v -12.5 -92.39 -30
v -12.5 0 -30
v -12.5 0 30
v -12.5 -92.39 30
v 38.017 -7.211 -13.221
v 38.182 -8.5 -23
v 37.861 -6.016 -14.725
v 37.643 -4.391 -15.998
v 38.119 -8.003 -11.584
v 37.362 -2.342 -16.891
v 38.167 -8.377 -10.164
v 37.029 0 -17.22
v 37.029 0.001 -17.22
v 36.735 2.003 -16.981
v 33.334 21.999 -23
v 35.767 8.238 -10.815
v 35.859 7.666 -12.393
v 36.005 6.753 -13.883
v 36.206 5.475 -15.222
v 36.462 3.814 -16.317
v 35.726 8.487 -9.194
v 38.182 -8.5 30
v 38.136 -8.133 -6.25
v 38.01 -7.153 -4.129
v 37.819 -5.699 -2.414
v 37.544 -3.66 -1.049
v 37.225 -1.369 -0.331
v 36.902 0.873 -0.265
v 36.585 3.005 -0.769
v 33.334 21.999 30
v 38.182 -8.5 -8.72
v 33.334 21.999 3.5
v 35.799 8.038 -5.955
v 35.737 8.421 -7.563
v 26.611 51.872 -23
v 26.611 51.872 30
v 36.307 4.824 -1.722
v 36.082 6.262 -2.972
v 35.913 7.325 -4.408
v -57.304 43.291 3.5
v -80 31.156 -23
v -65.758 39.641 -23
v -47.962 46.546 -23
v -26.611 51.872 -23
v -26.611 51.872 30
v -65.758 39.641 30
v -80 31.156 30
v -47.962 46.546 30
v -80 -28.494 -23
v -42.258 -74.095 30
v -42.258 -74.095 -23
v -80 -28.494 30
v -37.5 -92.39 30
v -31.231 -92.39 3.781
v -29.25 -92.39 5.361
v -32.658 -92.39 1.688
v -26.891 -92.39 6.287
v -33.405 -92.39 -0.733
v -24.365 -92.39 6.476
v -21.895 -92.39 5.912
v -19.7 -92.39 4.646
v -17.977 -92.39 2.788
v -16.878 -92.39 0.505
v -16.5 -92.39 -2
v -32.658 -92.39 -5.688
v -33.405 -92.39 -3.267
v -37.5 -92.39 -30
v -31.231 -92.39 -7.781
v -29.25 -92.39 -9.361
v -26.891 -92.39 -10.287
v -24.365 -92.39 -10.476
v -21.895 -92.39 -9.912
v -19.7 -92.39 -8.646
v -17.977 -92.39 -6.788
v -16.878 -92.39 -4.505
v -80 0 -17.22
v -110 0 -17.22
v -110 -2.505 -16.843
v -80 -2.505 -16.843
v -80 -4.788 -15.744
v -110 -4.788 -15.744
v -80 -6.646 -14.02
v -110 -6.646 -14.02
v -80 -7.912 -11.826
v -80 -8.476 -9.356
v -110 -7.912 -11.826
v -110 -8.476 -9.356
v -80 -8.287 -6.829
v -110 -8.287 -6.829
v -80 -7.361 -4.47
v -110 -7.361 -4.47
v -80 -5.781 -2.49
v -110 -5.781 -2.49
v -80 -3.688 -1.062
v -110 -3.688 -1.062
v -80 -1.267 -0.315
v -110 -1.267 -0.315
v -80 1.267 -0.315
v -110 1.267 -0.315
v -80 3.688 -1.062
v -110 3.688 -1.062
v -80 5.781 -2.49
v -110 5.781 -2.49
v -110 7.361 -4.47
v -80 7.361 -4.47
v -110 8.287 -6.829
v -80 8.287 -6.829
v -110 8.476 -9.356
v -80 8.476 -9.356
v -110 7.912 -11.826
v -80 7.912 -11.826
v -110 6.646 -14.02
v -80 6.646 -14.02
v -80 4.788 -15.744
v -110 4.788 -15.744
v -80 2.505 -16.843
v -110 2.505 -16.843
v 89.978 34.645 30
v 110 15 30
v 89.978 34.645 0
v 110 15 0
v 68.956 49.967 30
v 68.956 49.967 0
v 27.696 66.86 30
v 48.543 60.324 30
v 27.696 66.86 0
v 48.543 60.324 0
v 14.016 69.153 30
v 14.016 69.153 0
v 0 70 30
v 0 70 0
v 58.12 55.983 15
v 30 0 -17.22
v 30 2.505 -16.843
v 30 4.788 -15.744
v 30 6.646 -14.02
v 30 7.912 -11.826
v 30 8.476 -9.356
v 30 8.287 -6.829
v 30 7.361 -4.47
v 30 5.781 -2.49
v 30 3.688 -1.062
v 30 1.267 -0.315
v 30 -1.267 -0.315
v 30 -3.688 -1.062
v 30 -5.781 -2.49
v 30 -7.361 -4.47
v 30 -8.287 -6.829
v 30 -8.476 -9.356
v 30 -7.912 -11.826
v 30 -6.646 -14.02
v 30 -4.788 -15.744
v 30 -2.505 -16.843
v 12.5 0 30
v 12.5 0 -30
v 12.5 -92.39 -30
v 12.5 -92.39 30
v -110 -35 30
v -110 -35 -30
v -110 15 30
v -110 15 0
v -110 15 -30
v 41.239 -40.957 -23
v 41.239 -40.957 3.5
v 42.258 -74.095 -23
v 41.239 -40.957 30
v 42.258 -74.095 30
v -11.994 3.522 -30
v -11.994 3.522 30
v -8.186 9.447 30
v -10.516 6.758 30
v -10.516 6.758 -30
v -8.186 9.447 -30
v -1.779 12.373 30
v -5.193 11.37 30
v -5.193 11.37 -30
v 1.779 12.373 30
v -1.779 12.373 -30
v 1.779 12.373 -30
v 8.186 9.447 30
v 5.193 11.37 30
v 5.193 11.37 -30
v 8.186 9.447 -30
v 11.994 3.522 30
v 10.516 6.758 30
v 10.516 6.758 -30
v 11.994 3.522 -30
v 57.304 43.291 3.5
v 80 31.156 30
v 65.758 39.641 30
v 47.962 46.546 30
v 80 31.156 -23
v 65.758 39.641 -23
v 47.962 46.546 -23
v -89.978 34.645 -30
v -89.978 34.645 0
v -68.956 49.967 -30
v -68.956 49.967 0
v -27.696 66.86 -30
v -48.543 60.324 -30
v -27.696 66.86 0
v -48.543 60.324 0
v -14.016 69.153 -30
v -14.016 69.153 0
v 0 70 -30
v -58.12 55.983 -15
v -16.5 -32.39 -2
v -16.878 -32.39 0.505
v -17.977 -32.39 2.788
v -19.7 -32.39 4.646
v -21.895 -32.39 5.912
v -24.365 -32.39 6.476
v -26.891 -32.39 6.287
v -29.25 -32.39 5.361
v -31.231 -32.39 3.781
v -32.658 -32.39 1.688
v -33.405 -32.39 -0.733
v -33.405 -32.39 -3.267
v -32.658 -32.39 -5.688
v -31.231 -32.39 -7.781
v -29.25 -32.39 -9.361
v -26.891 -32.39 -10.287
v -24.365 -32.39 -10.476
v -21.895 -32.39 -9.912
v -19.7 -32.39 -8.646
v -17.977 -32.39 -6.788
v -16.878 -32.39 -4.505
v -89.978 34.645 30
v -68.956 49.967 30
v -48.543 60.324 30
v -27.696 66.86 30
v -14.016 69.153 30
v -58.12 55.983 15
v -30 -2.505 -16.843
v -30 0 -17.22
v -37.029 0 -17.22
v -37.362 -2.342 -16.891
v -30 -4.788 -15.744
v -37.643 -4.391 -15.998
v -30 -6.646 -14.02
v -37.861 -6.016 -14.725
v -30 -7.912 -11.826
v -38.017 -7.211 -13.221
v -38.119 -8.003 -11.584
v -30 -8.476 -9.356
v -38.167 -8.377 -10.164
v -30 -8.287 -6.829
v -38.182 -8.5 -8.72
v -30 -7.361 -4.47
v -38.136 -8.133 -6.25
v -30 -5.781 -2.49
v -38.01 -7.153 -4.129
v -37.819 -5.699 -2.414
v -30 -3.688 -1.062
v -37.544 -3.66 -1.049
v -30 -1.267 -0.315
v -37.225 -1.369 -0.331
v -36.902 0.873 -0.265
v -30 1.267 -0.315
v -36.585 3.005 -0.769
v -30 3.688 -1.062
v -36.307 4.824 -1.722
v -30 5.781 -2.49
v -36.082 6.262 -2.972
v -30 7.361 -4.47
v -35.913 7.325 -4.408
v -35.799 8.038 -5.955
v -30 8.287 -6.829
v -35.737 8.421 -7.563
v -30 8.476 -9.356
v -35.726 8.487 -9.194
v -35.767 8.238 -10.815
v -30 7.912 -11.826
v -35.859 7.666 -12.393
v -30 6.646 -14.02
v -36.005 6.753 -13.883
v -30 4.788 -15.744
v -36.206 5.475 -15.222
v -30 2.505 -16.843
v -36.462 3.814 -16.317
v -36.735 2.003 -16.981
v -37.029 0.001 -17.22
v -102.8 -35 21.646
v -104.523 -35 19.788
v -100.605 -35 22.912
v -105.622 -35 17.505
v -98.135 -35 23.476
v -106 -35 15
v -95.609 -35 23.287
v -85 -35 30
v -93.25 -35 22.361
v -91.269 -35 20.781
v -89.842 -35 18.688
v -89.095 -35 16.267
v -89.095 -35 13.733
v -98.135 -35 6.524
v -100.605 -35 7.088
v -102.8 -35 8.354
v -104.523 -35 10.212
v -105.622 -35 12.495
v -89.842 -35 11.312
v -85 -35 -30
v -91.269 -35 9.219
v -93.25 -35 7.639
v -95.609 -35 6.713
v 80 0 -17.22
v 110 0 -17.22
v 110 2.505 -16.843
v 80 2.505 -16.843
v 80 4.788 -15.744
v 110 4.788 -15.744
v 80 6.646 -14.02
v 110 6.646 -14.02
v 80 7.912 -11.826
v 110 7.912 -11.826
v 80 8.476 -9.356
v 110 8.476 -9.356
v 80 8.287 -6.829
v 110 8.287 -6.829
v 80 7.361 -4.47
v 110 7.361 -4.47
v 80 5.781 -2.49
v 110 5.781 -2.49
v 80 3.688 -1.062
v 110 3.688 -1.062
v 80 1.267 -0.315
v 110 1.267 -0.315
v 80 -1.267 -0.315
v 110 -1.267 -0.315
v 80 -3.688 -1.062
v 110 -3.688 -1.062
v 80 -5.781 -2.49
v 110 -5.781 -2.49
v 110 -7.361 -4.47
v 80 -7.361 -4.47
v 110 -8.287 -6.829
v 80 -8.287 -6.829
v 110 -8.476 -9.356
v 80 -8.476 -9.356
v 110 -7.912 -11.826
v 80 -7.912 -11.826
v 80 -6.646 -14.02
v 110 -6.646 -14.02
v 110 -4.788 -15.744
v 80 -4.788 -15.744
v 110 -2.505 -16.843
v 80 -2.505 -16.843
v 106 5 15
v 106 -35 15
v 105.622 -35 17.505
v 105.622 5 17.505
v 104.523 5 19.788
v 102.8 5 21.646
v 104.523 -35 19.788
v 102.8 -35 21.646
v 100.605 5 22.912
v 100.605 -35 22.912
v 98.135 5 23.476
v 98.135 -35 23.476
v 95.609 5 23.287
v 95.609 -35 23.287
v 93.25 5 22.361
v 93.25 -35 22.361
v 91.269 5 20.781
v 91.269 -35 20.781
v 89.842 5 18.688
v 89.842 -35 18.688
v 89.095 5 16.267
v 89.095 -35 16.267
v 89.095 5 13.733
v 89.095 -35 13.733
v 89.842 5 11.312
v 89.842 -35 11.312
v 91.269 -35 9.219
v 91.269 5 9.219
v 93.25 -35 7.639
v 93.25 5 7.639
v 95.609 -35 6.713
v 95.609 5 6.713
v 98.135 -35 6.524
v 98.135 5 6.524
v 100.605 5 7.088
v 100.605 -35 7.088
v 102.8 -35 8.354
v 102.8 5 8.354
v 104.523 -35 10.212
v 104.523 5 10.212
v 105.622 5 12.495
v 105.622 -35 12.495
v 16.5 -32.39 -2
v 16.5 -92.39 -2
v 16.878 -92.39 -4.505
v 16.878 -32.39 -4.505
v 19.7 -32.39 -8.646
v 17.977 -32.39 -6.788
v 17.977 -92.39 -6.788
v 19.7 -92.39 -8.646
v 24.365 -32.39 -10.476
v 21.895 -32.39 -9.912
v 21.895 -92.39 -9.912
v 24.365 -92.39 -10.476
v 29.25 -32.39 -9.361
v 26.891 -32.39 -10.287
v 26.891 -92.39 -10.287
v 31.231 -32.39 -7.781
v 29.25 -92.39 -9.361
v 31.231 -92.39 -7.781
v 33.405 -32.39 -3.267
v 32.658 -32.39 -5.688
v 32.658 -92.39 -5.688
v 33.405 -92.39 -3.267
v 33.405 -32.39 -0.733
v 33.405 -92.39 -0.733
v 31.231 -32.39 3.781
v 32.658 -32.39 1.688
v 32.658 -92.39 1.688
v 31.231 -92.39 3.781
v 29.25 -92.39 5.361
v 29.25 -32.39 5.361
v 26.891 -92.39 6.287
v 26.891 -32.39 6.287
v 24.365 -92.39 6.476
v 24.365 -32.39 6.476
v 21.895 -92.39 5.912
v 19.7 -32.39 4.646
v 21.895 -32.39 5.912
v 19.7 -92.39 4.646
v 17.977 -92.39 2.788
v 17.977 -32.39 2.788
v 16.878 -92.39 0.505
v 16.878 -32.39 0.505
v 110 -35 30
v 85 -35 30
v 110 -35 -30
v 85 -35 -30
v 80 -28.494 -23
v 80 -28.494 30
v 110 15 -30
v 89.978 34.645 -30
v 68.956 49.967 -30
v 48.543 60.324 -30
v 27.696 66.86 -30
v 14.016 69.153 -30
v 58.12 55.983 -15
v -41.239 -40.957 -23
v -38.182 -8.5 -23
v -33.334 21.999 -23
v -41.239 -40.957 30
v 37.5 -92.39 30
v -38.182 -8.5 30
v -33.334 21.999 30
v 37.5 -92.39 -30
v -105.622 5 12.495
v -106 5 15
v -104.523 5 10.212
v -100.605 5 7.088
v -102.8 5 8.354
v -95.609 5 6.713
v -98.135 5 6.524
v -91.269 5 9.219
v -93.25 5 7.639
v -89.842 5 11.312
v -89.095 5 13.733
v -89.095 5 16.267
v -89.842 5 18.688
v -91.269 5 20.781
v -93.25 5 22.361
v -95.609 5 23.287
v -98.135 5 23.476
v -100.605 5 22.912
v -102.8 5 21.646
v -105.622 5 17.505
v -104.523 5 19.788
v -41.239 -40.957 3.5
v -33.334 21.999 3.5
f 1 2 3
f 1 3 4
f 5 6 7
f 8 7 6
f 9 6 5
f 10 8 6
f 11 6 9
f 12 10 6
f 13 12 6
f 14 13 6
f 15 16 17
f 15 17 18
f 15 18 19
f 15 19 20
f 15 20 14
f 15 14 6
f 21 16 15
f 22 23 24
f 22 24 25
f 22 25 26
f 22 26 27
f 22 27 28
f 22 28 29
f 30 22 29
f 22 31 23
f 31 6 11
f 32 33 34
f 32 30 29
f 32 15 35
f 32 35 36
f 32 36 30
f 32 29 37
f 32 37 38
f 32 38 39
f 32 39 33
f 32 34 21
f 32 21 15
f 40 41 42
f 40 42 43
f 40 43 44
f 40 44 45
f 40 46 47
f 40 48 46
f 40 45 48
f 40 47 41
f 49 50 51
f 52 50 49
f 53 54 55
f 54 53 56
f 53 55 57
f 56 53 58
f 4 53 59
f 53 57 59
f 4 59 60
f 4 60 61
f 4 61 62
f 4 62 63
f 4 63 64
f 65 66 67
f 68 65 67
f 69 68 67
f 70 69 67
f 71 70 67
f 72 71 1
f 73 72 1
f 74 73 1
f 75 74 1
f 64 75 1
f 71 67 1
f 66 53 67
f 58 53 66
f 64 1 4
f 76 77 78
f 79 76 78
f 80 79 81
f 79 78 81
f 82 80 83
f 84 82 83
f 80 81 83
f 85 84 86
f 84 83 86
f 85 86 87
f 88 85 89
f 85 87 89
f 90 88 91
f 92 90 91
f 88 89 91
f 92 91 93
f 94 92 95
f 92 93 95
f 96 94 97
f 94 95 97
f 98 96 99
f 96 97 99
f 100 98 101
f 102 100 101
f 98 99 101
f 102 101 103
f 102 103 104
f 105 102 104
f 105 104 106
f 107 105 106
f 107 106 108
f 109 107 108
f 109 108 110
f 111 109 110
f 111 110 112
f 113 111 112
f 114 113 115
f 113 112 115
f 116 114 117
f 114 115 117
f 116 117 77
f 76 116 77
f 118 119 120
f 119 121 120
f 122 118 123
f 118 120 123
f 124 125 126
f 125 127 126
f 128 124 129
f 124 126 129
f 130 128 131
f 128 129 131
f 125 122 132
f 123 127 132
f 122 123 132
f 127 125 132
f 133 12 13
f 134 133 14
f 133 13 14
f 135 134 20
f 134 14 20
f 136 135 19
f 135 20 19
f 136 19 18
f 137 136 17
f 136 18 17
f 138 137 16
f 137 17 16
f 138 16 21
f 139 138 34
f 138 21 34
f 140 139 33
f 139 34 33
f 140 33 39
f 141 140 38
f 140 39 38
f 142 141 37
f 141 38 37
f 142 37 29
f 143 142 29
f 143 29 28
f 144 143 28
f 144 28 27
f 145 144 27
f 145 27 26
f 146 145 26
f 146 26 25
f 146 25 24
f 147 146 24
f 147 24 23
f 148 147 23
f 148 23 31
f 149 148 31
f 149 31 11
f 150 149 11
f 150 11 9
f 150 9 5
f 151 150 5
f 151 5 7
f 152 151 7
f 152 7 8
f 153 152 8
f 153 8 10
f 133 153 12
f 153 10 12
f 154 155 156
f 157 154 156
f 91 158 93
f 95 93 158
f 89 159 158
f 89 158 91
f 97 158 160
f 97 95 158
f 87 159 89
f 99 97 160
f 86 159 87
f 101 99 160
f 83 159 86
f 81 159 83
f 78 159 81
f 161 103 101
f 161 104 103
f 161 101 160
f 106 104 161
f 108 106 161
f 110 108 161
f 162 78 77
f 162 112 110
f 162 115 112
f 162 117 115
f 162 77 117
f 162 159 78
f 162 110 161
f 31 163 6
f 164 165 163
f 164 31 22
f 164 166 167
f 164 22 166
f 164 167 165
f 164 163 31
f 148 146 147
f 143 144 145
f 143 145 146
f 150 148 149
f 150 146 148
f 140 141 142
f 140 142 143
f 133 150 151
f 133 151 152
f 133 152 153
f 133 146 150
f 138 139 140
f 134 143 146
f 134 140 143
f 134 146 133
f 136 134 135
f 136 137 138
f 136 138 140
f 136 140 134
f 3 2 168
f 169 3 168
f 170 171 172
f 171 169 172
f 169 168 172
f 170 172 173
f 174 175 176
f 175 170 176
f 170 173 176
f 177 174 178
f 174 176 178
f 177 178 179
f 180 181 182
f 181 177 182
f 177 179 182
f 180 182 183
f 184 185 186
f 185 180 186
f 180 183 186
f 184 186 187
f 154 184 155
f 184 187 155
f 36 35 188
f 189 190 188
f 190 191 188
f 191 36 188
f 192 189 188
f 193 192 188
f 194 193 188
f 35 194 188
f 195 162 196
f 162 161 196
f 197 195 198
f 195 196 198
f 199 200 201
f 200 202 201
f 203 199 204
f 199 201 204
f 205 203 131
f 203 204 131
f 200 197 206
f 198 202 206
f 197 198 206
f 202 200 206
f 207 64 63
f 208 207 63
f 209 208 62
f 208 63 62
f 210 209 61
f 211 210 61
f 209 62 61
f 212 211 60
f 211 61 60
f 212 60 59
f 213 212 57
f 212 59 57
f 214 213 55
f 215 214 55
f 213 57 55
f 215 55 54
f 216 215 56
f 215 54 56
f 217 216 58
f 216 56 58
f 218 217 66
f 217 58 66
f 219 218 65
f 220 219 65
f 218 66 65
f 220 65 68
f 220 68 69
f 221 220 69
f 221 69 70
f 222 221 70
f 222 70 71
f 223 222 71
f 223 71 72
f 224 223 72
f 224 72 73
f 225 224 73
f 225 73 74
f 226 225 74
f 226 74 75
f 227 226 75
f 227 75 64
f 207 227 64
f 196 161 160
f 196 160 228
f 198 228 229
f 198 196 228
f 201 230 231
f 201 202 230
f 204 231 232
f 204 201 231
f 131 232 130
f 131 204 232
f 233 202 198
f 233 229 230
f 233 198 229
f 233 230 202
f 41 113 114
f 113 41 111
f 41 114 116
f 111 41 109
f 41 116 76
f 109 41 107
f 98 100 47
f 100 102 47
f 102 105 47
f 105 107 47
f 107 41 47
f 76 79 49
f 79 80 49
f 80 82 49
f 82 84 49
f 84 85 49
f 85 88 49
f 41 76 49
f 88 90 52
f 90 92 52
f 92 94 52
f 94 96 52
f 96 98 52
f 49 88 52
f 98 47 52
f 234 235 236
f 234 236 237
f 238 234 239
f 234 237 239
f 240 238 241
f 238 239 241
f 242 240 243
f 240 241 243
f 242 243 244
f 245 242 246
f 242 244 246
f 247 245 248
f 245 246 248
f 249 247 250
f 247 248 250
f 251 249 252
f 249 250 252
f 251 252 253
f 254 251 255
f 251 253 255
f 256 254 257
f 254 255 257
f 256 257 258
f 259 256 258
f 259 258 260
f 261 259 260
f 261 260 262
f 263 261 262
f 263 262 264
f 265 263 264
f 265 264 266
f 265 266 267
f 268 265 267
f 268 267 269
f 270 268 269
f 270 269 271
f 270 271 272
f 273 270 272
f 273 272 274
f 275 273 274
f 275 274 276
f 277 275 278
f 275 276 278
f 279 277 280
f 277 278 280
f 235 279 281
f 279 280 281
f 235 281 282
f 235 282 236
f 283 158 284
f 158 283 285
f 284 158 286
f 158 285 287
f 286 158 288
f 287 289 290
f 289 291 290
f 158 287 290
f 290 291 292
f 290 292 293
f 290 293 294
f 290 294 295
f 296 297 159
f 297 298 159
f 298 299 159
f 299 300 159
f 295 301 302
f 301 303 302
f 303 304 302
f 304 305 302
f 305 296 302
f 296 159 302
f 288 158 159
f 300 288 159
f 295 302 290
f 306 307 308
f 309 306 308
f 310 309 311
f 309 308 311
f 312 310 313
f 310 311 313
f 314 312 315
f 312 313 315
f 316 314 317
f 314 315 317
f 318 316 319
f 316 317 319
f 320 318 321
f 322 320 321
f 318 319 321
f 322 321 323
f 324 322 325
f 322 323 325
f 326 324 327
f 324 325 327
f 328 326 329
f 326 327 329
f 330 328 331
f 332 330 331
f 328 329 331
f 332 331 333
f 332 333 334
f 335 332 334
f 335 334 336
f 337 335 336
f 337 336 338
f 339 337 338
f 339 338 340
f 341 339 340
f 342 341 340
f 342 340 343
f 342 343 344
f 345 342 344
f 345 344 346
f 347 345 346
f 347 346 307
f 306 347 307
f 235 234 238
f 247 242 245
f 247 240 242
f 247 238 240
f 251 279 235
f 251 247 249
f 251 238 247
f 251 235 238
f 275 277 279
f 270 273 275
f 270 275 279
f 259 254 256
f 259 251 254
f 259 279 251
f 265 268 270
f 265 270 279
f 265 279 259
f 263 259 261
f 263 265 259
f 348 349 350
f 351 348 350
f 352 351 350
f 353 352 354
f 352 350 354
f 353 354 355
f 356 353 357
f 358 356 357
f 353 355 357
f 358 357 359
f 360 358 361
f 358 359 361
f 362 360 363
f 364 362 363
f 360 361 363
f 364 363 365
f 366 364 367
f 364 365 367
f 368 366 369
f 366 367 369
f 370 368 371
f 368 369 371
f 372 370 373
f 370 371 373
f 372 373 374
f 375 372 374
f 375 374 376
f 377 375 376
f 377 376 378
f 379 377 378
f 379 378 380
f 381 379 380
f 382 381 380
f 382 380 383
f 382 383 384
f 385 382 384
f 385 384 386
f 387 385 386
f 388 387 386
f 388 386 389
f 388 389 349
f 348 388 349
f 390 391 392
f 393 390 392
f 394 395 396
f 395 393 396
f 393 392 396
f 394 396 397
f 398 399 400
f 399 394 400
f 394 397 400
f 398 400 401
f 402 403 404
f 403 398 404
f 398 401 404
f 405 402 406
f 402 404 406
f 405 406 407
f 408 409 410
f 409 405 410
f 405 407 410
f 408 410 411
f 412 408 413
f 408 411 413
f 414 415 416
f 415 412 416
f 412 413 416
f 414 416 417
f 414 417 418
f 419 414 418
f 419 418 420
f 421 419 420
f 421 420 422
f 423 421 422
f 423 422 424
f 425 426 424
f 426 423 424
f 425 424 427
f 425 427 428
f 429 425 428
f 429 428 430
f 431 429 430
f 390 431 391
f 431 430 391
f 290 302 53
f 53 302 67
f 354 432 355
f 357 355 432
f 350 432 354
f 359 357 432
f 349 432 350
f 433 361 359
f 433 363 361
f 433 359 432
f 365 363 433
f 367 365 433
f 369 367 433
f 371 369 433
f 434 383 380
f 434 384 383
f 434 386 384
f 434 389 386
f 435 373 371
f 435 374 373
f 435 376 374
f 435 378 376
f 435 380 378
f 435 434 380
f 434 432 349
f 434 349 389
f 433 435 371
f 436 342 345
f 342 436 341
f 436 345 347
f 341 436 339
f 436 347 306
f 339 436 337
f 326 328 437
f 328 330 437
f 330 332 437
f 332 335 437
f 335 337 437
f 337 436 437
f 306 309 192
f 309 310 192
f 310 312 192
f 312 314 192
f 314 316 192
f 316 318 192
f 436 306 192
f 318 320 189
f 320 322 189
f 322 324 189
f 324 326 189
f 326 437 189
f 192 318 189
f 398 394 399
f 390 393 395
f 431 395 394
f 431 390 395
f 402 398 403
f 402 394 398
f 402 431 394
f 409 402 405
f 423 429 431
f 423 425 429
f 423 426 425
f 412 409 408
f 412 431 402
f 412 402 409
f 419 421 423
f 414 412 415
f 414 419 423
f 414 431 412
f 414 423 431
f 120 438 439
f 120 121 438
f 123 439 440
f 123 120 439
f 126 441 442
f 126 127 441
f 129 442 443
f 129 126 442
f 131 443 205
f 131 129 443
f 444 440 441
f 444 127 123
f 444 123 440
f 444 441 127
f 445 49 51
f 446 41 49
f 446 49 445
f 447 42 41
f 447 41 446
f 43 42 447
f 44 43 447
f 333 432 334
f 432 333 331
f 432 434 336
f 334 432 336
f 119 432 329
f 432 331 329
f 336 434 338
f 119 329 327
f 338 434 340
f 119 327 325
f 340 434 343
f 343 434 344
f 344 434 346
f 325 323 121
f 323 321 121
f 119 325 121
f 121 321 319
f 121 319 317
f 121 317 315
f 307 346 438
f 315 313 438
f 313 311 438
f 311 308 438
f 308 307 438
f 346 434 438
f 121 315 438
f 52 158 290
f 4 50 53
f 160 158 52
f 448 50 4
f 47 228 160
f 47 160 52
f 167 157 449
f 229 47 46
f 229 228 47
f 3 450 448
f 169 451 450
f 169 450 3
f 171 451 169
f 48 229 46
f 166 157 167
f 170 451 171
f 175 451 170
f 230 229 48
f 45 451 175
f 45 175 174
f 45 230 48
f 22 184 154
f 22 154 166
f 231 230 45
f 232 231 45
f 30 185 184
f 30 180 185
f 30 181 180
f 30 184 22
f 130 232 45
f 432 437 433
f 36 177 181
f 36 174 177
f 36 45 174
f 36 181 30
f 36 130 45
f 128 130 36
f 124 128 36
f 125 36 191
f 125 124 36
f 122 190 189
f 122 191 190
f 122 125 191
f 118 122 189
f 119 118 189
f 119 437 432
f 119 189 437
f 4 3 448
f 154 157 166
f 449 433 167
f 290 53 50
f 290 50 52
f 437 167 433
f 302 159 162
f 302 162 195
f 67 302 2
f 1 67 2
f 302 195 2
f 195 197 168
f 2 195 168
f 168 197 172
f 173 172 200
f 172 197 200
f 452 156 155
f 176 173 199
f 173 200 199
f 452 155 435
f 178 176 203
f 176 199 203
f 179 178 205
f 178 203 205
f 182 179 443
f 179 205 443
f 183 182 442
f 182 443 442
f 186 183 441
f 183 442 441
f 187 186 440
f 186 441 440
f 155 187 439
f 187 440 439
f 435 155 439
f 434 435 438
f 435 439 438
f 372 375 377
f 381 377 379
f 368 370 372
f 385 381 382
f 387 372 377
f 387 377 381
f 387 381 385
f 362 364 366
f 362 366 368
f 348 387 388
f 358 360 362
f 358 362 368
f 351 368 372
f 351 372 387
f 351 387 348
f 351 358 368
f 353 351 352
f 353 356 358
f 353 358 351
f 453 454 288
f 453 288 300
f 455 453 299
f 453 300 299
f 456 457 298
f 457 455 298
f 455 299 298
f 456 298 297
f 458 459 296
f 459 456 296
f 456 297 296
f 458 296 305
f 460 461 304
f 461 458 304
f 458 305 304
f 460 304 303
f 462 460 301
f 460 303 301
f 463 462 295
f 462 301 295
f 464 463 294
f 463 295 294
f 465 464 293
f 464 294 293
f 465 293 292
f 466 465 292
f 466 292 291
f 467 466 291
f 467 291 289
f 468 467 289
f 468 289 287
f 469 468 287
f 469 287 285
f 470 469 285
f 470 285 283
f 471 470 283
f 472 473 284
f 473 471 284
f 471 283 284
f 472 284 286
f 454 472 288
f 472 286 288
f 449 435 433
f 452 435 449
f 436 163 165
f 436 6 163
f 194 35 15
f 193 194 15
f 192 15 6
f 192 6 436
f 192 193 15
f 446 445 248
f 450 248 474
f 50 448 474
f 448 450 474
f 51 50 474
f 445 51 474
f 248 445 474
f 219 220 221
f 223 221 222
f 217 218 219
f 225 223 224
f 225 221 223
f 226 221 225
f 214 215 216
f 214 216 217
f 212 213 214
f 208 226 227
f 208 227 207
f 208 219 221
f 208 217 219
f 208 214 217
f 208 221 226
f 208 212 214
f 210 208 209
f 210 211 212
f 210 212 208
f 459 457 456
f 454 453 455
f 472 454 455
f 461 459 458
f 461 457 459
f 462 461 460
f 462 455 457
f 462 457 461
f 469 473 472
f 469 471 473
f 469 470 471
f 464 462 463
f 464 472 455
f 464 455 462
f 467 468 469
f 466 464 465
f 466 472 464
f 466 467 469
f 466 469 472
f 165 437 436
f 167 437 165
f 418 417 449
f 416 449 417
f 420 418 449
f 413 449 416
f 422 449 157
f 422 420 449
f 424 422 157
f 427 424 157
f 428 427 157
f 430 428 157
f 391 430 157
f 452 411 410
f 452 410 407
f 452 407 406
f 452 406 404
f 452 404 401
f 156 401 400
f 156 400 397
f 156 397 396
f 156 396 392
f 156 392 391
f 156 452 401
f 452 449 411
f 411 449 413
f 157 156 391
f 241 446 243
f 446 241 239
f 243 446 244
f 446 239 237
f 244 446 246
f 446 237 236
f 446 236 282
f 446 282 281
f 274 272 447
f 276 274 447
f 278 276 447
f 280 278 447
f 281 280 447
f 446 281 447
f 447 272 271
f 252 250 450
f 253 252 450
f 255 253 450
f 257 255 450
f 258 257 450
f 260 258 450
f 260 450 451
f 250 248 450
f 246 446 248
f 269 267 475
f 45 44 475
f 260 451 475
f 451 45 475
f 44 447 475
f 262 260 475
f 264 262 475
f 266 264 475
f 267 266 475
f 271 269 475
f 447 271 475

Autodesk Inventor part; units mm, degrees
ref_plane "YZ Plane" through (0, 0, 0) normal (1, 0, 0) x (0, 1, 0)
ref_plane "XZ Plane" through (0, 0, 0) normal (0, 1, 0) x (-1, 0, 0)
ref_plane "XY Plane" through (0, 0, 0) normal (0, 0, 1) x (1, 0, 0)
sketch "스케치1" plane through (0, 0, 0) normal (0, 0, 1) x (1, 0, 0)
  arc A0 (0, 12.5) -> (-12.5, 0) centre (0, 0) ccw
  line L0 (0, 220.6094) -> (0, -371.145)
  line L1 (-77.086, -220) -> (-110, -35)
  line L2 (-110, -35) -> (-110, 15)
  spline S0 degree 2 poles (-110, 15) (-61.239, 69.4656) (0, 70) knots 0 0 0 1 1 1
  line L3 (-29.7943, 69.74) -> (29.7943, 70.26) construction
  line L4 (-12.5, 0) -> (-12.5, -190)
  line L5 (-12.5, -190) -> (-29.9689, -220)
  line L6 (-29.9689, -220) -> (-77.086, -220)
  arc A1 (12.5, 0) -> (0, 12.5) centre (0, 0) ccw
  line L7 (77.086, -220) -> (110, -35)
  line L8 (110, -35) -> (110, 15)
  spline S1 degree 2 poles (110, 15) (61.239, 69.4656) (0, 70) knots 0 0 0 1 1 1
  line L9 (29.7943, 69.74) -> (-29.7943, 70.26) construction
  line L10 (12.5, 0) -> (12.5, -190)
  line L11 (12.5, -190) -> (29.9689, -220)
  line L12 (29.9689, -220) -> (77.086, -220)
  point P0 (1.2114, -68.8044)
  point P1 (23.5091, 68.2027)
  point P2 (-23.4485, 67.5354)
  point P3 (-1.2114, -68.8044)
  point P4 (-23.5091, 68.2027)
  point P5 (23.4485, 67.5354)
  point P6 (0, 70)
  dimension "d0" = 25
  dimension "d3" = 110
  dimension "d4" = 50
  dimension "d5" = 190
  dimension "d8" = 70
  dimension "d25" = 290
extrude "Wheel Body Initial Extrusion" add sketch "스케치1" along normal mid plane 60
sketch "스케치4" plane through (-12.5, -190, 30) normal (1, 0, 0) x (0, 0, -1)
  line L0 (60, 190) -> (0, 190) projected
  line L1 (60, 190) -> (60, 0) projected
  line L2 (60, 0) -> (0, 0) projected
  line L3 (0, 0) -> (0, 190) projected
  line L4 (0, 190) -> (0, -93.6851)
  line L5 (23, 50) -> (10, 50)
  line L6 (10, 50) -> (10, -48.4584)
  line L7 (10, -10.6044) -> (23, -10.6044)
  line L8 (23, -10.6044) -> (23, -50.5115)
  line L9 (23, -50.5115) -> (0, -50.5115)
  line L10 (53, -93.6851) -> (53, 276.7845)
  line L11 (53, 190) -> (0, 190)
  line L12 (53, 259.8429) -> (0, 259.8429)
  line L13 (0, 259.8429) -> (0, 0)
  point P0 (30, 190)
  dimension "d18" = 13
  dimension "d19" = 140
  dimension "d20" = 7
sketch "스케치7" plane through (0, 0, 30) normal (0, 0, 1) x (1, 0, 0)
  line L0 (-103, -34.3822) -> (-71.2215, -213)
  line L1 (-71.2215, -213) -> (-34.8207, -213)
  line L2 (-29.9689, -220) -> (-77.086, -220) projected
  line L3 (-34.8207, -213) -> (-19.5, -189.0198)
  line L4 (-19.5, -189.0198) -> (-19.5, 0)
  line L5 (-103, -34.3822) -> (-103, 27.8234)
  line L6 (-103, 27.8234) -> (-55.0885, 51.7889) construction
  line L7 (-55.0885, 51.7889) -> (35.24, 53.8015) construction
  spline S0 degree 2 poles (-103, 27.8234) (-55.0885, 51.7889) (35.24, 53.8015) knots 1 1 1 2 2 2
  line L8 (12.5, -190) -> (12.5, 0) projected
  arc A0 (12.5, 0) -> (-12.5, 0) centre (0, 0) ccw projected
  line L9 (-110, 15) -> (-110, -35) projected
  line L10 (-110, -35) -> (-77.086, -220) projected
  line L11 (-12.5, -190) -> (-12.5, 0) projected
  arc A1 (0, 19.5) -> (-19.5, 0) centre (0, 0) ccw
  line L12 (138.0234, -13.4315) -> (72.0365, -213)
  line L13 (72.0365, -213) -> (34.8207, -213)
  line L14 (34.8207, -213) -> (19.5, -189.0198)
  line L15 (19.5, -189.0198) -> (19.5, 0)
  line L16 (138.0234, -13.4315) -> (173.48, 27.8234)
  line L17 (173.48, 27.8234) -> (125.5685, 51.7889) construction
  line L18 (125.5685, 51.7889) -> (35.24, 53.8015) construction
  spline S1 degree 2 poles (173.48, 27.8234) (125.5685, 51.7889) (35.24, 53.8015) knots 1 1 1 2 2 2
  arc A2 (19.5, 0) -> (0, 19.5) centre (0, 0) ccw
  line L19 (72.0365, 0) -> (72.0365, -130)
  line L20 (106.0933, -110) -> (19.5, -110)
  line L21 (92.8673, -150) -> (19.5, -150)
  point P0 (-103, -3.2794)
  dimension "d40" = 7
  dimension "d42" = 7
  dimension "d43" = 7
  dimension "d44" = 7
  dimension "d53" = 130
  dimension "d54" = 20
  dimension "d57" = 40
extrude "Extrusion Cut for Thickness" [suppressed]
sketch "스케치8" plane through (110, -35, 30) normal (1, 0, 0) x (0, 0, -1)
  line L0 (60, 50) -> (60, 0) projected
  line L1 (60, 50) -> (30, 50)
  line L2 (60, 20) -> (60, 50)
  circle A0 centre (30, 35) radius 8.5
  dimension "d84" = 17
extrude "돌출3" [suppressed]
extrude "돌출4" [suppressed]
mirror "미러1" [suppressed]
extrude "돌출5" add sketch "스케치7" against normal blind 23 contours L12 L21 L15 L20
mirror "미러2" about plane through (0, 0, 0) normal (1, 0, 0) of "돌출5"
sketch "스케치21" plane through (0, 0, -30) normal (0, 0, -1) x (-1, 0, 0)
  line L0 (-77.086, -220) -> (-110, -35) projected
  line L1 (-110, -35) -> (-85, -35)
  line L2 (-85, -35) -> (-37.5, -92.3904)
  line L3 (-37.5, -92.3904) -> (-12.5, -92.3904)
  line L4 (-12.5, 0) -> (-12.5, -190) projected
  line L5 (0, 75.7954) -> (0, -227.3908)
  line L6 (110, -35) -> (85, -35)
  line L7 (85, -35) -> (37.5, -92.3904)
  line L8 (37.5, -92.3904) -> (12.5, -92.3904)
  line L9 (-110, -35) -> (-77.086, -220)
  line L10 (-29.9689, -220) -> (-77.086, -220) projected
  line L11 (-12.5, -190) -> (-29.9689, -220) projected
  line L12 (-29.9689, -220) -> (-12.5, -190)
  line L13 (-12.5, -190) -> (-12.5, -92.3904)
  line L14 (12.5, -92.3904) -> (12.5, -190)
  line L15 (29.9689, -220) -> (12.5, -190) projected
  line L16 (12.5, -190) -> (29.9689, -220)
  line L17 (110, -35) -> (77.086, -220) projected
  line L18 (29.9689, -220) -> (77.086, -220)
  line L19 (77.086, -220) -> (110, -35)
  point P0 (0, 0)
  dimension "d80" = 25
  dimension "d81" = 25
extrude "돌출9" cut sketch "스케치21" against normal blind 60
sketch "스케치22" plane through (110, 15, 30) normal (1, 0, 0) x (0, 0, -1)
  line L0 (60, -15) -> (0, -15) projected
  circle A0 centre (38.7205, -15) radius 8.5
  point P0 (30, -15)
  dimension "d86" = 17
extrude "돌출10" cut sketch "스케치22" against normal blind 80
sketch "스케치23" plane through (85, -35, -30) normal (0, -1, 0) x (1, 0, 0)
  circle A0 centre (12.5, 45) radius 8.5
  line L0 (25, 0) -> (25, 60) projected
  line L1 (0, 60) -> (25, 60) projected
  point P0 (-85, 30)
  dimension "d89" = 12.5
  dimension "d90" = 17
  dimension "d91" = 15
extrude "돌출11" cut sketch "스케치23" against normal blind 40
sketch "스케치24" plane through (12.5, -92.3904, -30) normal (0, -1, 0) x (1, 0, 0)
  circle A0 centre (-37.5, 28) radius 8.5
  circle A1 centre (85, 45) radius 8.5 projected
  line L0 (-50, 0) -> (-50, 60) projected
  point P0 (-12.5, 30)
  dimension "d94" = 17
  dimension "d95" = 17
  dimension "d98" = 12.5
extrude "돌출12" cut sketch "스케치24" against normal blind 60 contours A0
ref_plane "작업 평면6" through (0, 0, -30) normal (-1, 0, 0) x (0, 0, 1)
mirror "미러4" about plane through (0, 0, -30) normal (-1, 0, 0) of "돌출10", "돌출11", "돌출12"
sketch "스케치25" plane through (-106.0933, -110, 7) normal (-0.9494, -0.3139, 0) x (0, 0, 1)
  point P0 (-7, 71.1329)
sketch "스케치26" plane through (0, 0, -30) normal (-1, 0, 0) x (0, 0, 1)
  line L0 (94.4532, -100.7618) -> (-29.2969, -100.7618)
  line L1 (-29.2969, -100.7618) -> (-29.2969, -183.2619)
  line L2 (-29.2969, -183.2619) -> (94.4532, -183.2619)
  line L3 (94.4532, -183.2619) -> (94.4532, -100.7618)
  point P0 (30, 0)
extrude "돌출13" cut sketch "스케치26" along normal mid plane 574.75
sketch "스케치27" plane through (0, 0, 30) normal (0, 0, 1) x (1, 0, 0)
  line L0 (80, -28.4941) -> (80, 31.156)
  line L1 (89, -35) -> (89, 5) projected
  line L2 (37.5, -92.3904) -> (85, -35) projected
  line L3 (85, -35) -> (85, 52.6509)
  line L4 (33.5, -32.3904) -> (33.5, -92.3904) projected
  line L5 (85, -22.453) -> (42.2581, -74.0946)
  line L6 (110, -8.5) -> (30, -8.5) projected
  line L7 (80, 31.156) -> (61.3028, 45.0673) construction
  line L8 (61.3028, 45.0673) -> (26.6107, 51.872) construction
  spline S0 degree 2 poles (80, 31.156) (61.3028, 45.0673) (26.6107, 51.872) knots 1 1 1 2 2 2
  line L9 (42.2581, -74.0946) -> (42.2581, -8.5) construction
  line L10 (42.2581, -8.5) -> (26.6107, 51.872) construction
  spline S1 degree 2 poles (42.2581, -74.0946) (42.2581, -8.5) (26.6107, 51.872) knots 1 1 1 2 2 2
  point P0 (0, 0)
  dimension "d102" = 8
  dimension "d103" = 5
extrude "돌출14" cut sketch "스케치27" against normal blind 53 contours L5 S1 L6 L0 | L6 S1 S0 L0
mirror "미러5" about plane through (0, 0, -30) normal (-1, 0, 0) of "돌출14"
properties part number "5th Wheel Body"
